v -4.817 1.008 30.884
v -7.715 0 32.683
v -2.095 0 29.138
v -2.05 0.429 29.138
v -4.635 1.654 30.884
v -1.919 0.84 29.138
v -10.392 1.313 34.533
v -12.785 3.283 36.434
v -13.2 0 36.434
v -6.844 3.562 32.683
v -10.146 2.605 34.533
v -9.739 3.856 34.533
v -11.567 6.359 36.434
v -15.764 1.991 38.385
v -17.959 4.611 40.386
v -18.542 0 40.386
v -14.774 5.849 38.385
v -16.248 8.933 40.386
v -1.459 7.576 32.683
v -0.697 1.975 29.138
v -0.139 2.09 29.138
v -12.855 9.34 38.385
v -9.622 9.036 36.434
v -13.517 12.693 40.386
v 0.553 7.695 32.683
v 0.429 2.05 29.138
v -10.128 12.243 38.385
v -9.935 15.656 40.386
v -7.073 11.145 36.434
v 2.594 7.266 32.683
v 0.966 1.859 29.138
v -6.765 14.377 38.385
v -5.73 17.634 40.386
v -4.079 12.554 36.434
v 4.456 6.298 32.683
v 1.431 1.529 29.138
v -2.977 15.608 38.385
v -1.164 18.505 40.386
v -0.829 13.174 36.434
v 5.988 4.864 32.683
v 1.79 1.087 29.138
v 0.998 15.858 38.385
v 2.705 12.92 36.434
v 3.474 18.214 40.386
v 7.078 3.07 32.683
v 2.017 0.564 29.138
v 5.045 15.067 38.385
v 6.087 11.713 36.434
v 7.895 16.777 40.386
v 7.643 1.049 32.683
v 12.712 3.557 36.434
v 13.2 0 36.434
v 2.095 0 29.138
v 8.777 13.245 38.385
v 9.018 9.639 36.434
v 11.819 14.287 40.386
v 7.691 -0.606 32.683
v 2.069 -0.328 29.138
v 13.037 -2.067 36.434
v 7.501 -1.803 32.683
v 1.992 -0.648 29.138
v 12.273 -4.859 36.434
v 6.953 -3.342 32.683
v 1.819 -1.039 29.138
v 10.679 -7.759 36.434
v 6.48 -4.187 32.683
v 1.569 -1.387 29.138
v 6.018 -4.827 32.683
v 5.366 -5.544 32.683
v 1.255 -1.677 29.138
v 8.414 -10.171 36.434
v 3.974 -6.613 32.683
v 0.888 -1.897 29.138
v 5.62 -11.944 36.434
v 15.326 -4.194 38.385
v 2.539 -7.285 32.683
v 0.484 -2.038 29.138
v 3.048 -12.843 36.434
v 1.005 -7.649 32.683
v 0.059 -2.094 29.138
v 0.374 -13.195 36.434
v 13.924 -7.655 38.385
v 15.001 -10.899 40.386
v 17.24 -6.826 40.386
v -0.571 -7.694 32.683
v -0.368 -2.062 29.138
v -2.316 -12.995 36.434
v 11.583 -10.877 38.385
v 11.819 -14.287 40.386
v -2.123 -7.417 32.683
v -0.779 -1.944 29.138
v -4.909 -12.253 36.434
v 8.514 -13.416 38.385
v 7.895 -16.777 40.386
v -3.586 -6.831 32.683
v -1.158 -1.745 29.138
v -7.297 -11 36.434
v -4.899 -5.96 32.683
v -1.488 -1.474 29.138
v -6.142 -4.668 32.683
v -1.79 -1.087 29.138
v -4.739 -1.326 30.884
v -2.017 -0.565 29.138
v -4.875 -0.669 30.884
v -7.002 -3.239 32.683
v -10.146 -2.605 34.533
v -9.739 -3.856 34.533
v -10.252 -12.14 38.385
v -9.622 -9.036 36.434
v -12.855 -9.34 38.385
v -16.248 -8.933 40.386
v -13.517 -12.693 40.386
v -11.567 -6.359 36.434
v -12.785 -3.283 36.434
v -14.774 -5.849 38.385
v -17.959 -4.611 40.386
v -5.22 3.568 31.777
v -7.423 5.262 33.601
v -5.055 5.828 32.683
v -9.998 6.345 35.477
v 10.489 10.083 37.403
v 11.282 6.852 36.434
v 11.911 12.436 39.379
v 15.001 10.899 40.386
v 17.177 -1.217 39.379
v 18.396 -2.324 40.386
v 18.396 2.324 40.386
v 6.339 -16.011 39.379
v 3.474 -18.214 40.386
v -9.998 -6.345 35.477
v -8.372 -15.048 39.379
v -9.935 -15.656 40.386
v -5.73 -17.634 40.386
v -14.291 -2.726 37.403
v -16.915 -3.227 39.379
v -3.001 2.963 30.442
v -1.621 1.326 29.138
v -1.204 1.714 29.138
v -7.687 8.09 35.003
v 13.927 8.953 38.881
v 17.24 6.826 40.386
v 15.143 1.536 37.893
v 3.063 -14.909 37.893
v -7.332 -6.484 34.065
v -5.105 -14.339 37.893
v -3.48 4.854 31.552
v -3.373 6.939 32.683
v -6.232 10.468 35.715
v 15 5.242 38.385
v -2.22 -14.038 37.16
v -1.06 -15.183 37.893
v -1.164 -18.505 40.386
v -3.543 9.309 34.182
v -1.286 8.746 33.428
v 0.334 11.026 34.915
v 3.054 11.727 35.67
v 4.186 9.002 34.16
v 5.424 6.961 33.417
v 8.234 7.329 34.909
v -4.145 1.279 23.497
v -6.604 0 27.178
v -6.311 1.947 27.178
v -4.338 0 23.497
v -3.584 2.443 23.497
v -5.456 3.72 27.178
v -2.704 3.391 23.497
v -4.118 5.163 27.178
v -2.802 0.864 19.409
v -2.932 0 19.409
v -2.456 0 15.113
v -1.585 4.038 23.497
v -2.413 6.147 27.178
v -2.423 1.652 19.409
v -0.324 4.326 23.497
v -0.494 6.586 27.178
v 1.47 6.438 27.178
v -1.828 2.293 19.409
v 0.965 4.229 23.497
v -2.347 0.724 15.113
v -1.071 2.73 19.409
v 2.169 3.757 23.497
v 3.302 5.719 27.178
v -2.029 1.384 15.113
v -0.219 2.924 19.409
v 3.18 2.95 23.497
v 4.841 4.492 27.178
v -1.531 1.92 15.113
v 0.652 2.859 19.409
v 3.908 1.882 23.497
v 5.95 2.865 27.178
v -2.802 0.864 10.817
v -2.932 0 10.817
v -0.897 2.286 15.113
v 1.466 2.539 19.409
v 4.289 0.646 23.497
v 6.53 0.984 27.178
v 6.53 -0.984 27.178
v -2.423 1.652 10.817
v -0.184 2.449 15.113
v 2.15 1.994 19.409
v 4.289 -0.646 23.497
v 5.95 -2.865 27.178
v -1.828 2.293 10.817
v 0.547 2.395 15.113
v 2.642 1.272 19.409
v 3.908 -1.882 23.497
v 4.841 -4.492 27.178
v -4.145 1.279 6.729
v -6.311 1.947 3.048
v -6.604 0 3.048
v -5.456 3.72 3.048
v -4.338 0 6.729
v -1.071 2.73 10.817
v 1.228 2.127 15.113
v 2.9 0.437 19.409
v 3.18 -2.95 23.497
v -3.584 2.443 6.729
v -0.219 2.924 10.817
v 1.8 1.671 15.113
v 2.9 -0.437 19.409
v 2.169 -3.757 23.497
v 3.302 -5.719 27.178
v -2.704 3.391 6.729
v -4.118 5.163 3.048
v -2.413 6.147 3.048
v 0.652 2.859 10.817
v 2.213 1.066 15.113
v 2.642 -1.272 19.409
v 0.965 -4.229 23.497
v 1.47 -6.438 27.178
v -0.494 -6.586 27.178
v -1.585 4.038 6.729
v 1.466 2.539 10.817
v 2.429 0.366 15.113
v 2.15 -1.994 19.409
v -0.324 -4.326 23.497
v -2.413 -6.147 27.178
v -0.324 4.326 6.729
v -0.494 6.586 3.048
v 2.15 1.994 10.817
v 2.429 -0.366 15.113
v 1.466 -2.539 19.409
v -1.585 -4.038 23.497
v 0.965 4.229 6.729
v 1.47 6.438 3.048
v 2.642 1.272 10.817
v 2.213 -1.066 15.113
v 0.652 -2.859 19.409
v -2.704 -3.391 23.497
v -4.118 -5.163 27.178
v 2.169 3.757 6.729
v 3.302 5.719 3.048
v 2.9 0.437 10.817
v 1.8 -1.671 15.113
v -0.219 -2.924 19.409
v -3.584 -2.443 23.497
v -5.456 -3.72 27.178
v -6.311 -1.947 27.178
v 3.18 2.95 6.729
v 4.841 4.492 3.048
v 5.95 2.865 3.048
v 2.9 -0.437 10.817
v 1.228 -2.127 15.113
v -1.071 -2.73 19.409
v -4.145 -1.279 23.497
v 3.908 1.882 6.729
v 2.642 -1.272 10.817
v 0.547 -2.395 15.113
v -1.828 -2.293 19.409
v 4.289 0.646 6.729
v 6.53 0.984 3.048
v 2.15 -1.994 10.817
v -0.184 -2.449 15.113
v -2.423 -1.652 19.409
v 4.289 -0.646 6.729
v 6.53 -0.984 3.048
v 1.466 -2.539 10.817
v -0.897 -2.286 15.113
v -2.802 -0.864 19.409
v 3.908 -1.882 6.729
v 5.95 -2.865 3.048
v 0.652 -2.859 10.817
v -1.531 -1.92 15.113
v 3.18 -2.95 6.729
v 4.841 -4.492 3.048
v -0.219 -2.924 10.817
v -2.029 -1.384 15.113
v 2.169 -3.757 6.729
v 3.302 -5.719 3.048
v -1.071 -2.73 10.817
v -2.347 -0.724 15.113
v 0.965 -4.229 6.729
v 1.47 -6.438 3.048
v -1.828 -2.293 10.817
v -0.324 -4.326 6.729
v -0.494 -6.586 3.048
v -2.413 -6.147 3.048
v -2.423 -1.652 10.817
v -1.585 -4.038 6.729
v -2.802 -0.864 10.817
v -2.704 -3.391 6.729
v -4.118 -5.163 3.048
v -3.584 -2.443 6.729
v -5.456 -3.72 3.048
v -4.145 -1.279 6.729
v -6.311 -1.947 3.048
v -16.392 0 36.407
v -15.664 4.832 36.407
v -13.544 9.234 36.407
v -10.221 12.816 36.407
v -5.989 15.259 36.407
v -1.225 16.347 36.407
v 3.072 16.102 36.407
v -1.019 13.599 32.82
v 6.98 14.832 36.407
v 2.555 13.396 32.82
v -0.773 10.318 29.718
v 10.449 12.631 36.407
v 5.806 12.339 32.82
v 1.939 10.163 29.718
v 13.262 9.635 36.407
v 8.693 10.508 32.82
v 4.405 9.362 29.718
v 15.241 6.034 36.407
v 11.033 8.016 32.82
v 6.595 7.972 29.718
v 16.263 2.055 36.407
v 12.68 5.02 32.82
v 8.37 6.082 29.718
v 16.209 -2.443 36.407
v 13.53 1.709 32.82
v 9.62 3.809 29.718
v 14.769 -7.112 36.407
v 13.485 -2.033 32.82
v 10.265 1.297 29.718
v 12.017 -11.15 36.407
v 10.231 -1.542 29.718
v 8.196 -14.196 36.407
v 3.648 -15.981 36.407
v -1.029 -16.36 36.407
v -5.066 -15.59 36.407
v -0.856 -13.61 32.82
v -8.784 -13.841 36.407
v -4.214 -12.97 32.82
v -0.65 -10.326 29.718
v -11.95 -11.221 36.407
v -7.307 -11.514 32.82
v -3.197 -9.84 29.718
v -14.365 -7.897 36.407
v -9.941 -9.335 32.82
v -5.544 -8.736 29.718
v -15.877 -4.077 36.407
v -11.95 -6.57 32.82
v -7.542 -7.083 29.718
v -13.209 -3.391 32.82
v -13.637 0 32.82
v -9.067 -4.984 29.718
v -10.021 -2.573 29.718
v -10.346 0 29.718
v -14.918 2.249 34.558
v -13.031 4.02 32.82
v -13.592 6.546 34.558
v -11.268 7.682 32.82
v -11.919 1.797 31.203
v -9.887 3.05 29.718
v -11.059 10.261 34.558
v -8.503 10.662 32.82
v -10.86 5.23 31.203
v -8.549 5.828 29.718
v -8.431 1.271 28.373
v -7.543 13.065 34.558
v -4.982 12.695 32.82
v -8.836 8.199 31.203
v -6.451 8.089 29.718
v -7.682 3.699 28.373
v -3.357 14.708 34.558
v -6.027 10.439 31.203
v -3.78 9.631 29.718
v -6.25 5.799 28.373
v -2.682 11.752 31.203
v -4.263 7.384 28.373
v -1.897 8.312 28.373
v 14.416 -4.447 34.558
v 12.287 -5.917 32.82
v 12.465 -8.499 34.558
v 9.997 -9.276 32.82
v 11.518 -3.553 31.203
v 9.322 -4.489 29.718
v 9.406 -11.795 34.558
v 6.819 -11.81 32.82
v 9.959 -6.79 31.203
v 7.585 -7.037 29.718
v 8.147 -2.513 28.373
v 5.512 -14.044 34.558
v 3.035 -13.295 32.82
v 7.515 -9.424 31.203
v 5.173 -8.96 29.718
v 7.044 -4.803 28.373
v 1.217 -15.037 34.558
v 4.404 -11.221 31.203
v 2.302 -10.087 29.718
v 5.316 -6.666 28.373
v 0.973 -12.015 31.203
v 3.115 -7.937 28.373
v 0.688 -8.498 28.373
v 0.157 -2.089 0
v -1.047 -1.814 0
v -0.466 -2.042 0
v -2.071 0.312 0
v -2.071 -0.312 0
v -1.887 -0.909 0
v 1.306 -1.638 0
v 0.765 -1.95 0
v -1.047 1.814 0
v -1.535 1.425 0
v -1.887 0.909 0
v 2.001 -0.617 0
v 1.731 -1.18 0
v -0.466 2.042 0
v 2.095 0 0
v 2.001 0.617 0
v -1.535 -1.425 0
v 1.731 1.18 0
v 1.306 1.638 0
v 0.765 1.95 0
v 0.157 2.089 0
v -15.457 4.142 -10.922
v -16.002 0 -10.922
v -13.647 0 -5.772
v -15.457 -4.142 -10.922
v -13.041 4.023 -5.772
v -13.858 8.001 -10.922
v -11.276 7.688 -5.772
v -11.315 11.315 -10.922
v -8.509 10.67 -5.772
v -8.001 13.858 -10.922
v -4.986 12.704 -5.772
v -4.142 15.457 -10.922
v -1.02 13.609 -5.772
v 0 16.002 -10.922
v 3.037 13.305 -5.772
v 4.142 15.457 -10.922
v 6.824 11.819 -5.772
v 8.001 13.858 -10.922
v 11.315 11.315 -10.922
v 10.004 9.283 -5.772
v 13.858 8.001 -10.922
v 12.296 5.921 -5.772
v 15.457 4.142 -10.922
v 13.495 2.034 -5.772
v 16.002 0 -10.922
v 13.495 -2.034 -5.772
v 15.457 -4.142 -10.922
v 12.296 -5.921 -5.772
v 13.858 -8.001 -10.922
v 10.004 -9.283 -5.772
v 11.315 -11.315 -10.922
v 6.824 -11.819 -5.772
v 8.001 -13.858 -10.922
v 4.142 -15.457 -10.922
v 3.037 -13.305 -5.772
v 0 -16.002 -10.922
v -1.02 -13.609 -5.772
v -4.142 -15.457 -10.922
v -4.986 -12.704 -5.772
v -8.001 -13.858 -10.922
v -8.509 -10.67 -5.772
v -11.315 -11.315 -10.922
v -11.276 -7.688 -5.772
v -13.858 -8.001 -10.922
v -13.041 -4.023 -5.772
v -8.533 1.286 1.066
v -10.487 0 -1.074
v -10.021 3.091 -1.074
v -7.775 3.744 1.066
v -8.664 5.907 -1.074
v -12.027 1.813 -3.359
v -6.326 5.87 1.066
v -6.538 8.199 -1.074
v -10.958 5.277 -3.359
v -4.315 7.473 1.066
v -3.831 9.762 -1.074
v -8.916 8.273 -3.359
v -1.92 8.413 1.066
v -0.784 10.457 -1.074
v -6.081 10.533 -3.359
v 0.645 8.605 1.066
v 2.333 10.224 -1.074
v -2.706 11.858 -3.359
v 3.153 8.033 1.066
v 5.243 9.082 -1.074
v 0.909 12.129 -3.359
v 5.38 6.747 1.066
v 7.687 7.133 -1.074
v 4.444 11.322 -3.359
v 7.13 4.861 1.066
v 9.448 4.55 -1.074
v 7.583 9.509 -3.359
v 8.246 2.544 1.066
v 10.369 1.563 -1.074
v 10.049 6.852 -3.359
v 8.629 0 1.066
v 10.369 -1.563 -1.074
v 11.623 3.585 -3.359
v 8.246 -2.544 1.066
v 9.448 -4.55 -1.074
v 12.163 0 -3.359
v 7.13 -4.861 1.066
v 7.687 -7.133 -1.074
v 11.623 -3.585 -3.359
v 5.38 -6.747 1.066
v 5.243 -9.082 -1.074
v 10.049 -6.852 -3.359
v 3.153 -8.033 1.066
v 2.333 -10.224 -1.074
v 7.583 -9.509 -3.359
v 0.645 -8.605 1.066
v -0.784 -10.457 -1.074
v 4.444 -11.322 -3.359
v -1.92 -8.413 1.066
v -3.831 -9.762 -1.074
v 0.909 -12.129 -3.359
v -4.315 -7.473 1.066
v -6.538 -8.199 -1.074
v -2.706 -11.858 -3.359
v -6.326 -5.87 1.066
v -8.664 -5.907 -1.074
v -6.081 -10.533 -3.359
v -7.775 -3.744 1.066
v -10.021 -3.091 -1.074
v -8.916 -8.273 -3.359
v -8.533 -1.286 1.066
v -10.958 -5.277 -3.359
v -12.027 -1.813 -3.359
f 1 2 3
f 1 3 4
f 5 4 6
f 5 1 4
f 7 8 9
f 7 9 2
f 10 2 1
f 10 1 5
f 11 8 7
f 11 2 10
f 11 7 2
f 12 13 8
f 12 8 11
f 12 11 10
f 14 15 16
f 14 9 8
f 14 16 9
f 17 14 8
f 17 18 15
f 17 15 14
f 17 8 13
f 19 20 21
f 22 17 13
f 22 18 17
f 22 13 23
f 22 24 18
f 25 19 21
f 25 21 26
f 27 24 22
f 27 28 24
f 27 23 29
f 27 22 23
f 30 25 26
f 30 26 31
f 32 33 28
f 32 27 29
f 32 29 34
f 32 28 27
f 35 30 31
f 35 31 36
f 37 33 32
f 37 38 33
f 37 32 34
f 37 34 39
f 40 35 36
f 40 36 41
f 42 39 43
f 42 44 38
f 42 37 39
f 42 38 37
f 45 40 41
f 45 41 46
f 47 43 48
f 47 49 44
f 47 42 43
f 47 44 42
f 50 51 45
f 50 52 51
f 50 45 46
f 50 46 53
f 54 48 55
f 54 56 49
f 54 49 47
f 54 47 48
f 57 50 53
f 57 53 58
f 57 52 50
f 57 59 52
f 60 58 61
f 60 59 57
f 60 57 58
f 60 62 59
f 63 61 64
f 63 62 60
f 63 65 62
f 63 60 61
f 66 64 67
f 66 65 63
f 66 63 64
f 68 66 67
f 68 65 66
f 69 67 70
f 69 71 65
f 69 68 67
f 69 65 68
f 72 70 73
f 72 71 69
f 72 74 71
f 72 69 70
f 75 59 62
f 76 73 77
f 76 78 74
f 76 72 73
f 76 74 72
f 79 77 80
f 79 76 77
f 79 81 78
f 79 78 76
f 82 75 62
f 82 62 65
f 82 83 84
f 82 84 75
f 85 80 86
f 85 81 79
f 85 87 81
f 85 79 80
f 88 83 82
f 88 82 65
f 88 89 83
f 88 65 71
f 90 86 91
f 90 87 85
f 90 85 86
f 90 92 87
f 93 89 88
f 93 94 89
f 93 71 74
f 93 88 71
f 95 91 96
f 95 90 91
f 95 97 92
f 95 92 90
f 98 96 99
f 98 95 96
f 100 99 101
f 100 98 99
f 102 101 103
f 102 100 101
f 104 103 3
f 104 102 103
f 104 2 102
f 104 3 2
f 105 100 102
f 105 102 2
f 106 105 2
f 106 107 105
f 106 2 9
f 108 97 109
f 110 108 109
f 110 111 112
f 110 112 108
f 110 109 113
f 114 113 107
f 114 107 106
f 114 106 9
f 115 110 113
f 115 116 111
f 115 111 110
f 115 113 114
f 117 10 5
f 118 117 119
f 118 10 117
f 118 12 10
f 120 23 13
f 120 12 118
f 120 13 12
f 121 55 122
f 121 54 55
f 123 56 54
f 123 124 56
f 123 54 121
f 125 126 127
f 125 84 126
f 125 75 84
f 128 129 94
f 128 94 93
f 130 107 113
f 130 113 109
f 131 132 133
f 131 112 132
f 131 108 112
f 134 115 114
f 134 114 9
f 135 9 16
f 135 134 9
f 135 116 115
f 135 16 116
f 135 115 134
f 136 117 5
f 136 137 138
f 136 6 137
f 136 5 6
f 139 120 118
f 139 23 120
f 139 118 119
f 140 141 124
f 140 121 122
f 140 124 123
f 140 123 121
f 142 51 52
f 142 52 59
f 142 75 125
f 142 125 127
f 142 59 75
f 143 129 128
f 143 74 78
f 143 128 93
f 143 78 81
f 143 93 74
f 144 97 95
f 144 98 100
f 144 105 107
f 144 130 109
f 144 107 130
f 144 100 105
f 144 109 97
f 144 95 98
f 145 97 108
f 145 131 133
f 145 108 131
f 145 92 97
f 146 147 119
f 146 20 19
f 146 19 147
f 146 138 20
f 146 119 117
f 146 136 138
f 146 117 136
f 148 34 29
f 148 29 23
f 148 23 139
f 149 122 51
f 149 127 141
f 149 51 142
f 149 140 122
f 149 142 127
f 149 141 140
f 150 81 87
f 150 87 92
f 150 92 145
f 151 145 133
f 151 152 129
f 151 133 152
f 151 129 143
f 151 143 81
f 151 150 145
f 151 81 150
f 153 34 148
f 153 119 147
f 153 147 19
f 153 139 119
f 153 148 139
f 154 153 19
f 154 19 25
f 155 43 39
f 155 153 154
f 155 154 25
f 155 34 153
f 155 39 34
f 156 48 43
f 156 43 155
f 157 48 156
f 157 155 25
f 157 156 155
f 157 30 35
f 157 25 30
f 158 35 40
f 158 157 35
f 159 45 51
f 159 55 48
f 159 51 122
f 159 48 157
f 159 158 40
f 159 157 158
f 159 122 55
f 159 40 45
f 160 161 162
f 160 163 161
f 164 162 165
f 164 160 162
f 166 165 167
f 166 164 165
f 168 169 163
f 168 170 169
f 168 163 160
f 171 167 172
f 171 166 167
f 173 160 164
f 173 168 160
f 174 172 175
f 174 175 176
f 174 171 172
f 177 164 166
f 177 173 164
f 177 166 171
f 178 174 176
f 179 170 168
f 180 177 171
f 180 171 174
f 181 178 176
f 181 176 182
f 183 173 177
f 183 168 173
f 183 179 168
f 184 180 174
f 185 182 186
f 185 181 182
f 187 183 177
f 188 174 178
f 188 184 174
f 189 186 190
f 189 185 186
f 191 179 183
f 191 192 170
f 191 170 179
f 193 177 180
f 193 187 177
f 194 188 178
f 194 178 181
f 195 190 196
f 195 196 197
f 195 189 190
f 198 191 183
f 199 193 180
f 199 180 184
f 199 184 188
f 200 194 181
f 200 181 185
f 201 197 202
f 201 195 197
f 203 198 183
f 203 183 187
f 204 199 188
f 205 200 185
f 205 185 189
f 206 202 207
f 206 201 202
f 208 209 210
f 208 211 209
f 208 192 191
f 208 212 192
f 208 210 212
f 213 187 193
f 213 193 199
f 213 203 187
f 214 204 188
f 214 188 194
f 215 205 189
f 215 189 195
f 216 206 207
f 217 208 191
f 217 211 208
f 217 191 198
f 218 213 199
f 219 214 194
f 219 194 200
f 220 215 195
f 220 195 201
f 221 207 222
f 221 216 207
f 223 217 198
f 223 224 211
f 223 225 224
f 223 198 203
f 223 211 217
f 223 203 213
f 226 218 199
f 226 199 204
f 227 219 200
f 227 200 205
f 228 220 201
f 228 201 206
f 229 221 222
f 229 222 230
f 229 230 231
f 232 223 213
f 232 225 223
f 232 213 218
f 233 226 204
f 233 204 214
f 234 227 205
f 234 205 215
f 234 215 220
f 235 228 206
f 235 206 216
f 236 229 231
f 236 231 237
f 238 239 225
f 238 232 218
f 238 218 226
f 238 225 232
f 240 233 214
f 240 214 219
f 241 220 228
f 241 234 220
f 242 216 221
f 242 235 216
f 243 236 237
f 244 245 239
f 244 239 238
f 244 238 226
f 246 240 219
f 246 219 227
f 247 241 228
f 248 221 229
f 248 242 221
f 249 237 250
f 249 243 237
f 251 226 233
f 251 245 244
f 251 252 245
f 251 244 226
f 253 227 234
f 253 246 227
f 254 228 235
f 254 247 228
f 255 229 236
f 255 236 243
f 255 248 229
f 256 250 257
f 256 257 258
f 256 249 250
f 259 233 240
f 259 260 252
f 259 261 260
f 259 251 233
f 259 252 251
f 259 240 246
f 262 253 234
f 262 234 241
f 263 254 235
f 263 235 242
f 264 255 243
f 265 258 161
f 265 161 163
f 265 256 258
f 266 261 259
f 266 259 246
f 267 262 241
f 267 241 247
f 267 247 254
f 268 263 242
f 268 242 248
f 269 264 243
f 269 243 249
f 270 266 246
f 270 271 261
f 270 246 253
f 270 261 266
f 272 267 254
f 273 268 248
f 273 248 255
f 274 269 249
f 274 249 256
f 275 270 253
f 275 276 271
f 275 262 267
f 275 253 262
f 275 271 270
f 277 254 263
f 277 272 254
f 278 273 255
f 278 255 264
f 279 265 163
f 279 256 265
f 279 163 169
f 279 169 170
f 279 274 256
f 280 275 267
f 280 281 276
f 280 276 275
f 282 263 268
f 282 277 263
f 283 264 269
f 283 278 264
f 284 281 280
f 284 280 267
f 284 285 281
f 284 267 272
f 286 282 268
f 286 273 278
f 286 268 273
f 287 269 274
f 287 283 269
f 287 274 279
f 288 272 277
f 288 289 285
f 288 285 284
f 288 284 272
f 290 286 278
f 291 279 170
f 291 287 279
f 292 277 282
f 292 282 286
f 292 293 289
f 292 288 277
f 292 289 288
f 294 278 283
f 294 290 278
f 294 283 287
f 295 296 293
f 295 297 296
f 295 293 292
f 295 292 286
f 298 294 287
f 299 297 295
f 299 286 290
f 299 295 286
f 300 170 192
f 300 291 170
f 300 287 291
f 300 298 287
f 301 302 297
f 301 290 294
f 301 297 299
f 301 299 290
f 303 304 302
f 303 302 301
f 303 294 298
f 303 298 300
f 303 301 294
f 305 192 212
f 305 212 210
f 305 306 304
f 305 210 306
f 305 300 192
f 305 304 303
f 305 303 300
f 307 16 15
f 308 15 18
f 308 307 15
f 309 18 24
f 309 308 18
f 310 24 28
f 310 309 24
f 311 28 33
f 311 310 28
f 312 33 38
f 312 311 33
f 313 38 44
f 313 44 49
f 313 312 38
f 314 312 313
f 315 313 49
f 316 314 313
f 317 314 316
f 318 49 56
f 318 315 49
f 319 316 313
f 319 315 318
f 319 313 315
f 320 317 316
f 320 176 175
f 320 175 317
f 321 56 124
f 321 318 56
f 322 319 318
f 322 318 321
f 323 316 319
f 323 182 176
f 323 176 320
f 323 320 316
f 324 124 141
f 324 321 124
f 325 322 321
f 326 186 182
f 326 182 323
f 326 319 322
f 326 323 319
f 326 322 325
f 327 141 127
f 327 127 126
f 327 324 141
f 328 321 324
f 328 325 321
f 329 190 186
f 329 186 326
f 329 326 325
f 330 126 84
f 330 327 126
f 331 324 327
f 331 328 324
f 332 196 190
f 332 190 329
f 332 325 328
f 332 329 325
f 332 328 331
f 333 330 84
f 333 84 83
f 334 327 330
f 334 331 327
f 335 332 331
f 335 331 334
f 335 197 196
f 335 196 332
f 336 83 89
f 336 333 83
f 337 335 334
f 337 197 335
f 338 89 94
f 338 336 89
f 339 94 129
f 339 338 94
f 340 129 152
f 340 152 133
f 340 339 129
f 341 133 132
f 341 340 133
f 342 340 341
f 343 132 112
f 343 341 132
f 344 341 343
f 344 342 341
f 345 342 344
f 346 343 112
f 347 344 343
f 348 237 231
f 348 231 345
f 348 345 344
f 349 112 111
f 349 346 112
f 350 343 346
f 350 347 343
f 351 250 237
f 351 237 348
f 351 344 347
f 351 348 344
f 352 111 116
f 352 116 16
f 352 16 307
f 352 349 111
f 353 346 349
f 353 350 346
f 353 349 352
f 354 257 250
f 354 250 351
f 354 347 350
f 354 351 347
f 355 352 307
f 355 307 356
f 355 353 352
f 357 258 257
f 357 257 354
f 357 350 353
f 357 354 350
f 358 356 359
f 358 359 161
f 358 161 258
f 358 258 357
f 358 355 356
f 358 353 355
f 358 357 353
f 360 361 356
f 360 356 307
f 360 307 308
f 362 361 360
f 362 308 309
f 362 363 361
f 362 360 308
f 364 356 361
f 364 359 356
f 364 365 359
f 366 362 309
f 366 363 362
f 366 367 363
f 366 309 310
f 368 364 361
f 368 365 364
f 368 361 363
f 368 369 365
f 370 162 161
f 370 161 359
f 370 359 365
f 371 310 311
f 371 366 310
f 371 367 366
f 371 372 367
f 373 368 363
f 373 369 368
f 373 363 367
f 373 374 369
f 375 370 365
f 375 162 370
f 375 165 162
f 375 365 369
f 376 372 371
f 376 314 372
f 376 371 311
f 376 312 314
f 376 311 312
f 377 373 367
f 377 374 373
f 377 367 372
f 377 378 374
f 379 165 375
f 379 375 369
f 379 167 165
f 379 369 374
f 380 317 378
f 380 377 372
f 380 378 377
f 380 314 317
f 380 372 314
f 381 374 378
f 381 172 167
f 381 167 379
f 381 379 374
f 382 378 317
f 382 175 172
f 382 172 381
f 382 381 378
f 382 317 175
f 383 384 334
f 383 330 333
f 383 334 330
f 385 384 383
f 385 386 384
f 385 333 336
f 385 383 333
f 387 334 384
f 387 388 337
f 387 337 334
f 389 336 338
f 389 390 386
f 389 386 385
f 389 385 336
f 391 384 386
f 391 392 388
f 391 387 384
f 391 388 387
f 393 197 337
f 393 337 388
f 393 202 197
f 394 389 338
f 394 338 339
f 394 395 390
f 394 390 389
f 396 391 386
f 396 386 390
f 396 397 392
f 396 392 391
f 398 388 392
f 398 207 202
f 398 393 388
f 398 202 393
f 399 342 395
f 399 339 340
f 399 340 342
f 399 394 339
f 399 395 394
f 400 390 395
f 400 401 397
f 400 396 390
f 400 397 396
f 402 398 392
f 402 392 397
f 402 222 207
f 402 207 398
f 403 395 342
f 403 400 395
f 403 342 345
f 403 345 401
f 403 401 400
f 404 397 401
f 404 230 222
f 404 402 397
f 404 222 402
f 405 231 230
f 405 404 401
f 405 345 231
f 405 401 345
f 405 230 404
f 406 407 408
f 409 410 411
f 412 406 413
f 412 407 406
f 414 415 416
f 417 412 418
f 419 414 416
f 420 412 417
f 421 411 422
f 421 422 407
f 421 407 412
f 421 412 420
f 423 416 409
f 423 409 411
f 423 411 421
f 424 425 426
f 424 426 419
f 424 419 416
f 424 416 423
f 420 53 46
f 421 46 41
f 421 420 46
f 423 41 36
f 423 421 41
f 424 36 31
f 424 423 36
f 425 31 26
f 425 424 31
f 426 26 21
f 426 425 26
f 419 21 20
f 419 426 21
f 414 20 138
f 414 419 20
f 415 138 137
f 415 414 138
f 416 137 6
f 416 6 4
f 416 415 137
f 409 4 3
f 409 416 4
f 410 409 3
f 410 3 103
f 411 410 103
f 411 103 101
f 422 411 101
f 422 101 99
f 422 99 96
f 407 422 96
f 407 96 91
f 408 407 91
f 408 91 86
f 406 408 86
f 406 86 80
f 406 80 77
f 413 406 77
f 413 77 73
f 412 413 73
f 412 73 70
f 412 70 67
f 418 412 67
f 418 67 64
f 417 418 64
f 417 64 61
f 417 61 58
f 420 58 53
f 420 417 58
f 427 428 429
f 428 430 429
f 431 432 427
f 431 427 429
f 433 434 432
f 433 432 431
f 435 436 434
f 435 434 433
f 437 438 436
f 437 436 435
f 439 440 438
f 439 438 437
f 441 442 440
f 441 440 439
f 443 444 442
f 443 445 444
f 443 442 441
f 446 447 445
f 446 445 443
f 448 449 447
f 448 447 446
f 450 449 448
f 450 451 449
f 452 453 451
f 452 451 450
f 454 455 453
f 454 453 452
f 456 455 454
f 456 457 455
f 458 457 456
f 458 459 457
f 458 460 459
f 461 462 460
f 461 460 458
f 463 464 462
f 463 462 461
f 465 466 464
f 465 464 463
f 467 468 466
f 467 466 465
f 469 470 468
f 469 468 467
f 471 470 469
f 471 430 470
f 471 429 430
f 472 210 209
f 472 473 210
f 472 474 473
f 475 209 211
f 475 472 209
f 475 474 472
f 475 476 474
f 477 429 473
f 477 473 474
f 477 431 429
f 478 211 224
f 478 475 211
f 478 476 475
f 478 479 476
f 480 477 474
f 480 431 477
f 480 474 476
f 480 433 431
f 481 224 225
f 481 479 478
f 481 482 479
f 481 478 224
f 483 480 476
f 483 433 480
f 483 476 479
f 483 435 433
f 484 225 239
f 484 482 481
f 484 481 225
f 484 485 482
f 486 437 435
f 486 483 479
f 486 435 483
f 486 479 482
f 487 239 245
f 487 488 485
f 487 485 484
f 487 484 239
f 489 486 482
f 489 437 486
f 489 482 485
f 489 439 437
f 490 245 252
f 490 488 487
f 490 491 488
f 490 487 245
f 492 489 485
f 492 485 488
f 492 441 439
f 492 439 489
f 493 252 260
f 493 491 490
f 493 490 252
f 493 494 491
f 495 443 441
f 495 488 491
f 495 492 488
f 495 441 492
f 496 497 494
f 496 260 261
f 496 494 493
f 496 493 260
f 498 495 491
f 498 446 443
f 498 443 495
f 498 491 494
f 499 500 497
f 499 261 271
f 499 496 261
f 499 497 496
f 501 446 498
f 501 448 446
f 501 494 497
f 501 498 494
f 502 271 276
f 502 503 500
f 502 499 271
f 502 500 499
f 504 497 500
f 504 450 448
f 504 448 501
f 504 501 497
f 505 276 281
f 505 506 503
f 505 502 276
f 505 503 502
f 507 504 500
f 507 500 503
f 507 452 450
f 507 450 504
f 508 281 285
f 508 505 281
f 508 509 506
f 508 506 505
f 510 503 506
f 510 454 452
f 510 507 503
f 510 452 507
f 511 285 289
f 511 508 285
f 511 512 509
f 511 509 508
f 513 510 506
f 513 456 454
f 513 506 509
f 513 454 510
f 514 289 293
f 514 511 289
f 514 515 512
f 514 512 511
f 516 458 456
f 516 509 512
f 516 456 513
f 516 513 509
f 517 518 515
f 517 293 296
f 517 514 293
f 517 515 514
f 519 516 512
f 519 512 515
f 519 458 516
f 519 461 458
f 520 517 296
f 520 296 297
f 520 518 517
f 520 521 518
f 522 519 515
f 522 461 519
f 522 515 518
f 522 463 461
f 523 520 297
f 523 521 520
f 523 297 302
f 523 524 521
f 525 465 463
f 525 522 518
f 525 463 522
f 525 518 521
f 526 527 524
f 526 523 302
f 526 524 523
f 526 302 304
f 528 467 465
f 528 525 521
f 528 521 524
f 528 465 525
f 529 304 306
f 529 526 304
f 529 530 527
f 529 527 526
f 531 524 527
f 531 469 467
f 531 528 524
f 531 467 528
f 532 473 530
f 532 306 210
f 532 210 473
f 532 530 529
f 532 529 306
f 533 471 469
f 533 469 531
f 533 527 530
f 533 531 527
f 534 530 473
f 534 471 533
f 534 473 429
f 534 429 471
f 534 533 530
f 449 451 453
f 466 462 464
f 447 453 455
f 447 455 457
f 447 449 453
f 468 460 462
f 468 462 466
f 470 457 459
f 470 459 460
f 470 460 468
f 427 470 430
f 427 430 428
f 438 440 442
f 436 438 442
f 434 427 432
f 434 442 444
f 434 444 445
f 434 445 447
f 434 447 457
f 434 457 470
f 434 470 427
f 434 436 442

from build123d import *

# Parameters (mm, degrees)
F2_R     = 2.094537
F3_DEPTH = 381


with BuildPart() as f1:
    # F0 (on Front) → F1 (revolve)
    with BuildSketch(Plane.XZ):
        with BuildLine():
            Line((0, -10.922001), (0, 27.889501))
            ThreePointArc((0, 27.889501), (-9.466287, 33.847991), (-18.542001, 40.386003))
            ThreePointArc((-18.542001, 40.386003), (-13.637245, 32.820088), (-6.604, 27.178001))
            ThreePointArc((-6.604, 27.178001), (-2.456113, 15.113), (-6.604, 3.048))
            ThreePointArc((-6.604, 3.048), (-12.162892, -3.358528), (-16.002001, -10.922001))
            Line((-16.002001, -10.922001), (0, -10.922001))
        make_face()
    revolve(axis=Axis((0, 0, -0.762001), (0, 0, -1)))

    # F2 (on Top) → F3 (cut)
    with BuildSketch(Plane.XY):
        Circle(F2_R)
    extrude(amount=F3_DEPTH, mode=Mode.SUBTRACT)


solid = f1.part
